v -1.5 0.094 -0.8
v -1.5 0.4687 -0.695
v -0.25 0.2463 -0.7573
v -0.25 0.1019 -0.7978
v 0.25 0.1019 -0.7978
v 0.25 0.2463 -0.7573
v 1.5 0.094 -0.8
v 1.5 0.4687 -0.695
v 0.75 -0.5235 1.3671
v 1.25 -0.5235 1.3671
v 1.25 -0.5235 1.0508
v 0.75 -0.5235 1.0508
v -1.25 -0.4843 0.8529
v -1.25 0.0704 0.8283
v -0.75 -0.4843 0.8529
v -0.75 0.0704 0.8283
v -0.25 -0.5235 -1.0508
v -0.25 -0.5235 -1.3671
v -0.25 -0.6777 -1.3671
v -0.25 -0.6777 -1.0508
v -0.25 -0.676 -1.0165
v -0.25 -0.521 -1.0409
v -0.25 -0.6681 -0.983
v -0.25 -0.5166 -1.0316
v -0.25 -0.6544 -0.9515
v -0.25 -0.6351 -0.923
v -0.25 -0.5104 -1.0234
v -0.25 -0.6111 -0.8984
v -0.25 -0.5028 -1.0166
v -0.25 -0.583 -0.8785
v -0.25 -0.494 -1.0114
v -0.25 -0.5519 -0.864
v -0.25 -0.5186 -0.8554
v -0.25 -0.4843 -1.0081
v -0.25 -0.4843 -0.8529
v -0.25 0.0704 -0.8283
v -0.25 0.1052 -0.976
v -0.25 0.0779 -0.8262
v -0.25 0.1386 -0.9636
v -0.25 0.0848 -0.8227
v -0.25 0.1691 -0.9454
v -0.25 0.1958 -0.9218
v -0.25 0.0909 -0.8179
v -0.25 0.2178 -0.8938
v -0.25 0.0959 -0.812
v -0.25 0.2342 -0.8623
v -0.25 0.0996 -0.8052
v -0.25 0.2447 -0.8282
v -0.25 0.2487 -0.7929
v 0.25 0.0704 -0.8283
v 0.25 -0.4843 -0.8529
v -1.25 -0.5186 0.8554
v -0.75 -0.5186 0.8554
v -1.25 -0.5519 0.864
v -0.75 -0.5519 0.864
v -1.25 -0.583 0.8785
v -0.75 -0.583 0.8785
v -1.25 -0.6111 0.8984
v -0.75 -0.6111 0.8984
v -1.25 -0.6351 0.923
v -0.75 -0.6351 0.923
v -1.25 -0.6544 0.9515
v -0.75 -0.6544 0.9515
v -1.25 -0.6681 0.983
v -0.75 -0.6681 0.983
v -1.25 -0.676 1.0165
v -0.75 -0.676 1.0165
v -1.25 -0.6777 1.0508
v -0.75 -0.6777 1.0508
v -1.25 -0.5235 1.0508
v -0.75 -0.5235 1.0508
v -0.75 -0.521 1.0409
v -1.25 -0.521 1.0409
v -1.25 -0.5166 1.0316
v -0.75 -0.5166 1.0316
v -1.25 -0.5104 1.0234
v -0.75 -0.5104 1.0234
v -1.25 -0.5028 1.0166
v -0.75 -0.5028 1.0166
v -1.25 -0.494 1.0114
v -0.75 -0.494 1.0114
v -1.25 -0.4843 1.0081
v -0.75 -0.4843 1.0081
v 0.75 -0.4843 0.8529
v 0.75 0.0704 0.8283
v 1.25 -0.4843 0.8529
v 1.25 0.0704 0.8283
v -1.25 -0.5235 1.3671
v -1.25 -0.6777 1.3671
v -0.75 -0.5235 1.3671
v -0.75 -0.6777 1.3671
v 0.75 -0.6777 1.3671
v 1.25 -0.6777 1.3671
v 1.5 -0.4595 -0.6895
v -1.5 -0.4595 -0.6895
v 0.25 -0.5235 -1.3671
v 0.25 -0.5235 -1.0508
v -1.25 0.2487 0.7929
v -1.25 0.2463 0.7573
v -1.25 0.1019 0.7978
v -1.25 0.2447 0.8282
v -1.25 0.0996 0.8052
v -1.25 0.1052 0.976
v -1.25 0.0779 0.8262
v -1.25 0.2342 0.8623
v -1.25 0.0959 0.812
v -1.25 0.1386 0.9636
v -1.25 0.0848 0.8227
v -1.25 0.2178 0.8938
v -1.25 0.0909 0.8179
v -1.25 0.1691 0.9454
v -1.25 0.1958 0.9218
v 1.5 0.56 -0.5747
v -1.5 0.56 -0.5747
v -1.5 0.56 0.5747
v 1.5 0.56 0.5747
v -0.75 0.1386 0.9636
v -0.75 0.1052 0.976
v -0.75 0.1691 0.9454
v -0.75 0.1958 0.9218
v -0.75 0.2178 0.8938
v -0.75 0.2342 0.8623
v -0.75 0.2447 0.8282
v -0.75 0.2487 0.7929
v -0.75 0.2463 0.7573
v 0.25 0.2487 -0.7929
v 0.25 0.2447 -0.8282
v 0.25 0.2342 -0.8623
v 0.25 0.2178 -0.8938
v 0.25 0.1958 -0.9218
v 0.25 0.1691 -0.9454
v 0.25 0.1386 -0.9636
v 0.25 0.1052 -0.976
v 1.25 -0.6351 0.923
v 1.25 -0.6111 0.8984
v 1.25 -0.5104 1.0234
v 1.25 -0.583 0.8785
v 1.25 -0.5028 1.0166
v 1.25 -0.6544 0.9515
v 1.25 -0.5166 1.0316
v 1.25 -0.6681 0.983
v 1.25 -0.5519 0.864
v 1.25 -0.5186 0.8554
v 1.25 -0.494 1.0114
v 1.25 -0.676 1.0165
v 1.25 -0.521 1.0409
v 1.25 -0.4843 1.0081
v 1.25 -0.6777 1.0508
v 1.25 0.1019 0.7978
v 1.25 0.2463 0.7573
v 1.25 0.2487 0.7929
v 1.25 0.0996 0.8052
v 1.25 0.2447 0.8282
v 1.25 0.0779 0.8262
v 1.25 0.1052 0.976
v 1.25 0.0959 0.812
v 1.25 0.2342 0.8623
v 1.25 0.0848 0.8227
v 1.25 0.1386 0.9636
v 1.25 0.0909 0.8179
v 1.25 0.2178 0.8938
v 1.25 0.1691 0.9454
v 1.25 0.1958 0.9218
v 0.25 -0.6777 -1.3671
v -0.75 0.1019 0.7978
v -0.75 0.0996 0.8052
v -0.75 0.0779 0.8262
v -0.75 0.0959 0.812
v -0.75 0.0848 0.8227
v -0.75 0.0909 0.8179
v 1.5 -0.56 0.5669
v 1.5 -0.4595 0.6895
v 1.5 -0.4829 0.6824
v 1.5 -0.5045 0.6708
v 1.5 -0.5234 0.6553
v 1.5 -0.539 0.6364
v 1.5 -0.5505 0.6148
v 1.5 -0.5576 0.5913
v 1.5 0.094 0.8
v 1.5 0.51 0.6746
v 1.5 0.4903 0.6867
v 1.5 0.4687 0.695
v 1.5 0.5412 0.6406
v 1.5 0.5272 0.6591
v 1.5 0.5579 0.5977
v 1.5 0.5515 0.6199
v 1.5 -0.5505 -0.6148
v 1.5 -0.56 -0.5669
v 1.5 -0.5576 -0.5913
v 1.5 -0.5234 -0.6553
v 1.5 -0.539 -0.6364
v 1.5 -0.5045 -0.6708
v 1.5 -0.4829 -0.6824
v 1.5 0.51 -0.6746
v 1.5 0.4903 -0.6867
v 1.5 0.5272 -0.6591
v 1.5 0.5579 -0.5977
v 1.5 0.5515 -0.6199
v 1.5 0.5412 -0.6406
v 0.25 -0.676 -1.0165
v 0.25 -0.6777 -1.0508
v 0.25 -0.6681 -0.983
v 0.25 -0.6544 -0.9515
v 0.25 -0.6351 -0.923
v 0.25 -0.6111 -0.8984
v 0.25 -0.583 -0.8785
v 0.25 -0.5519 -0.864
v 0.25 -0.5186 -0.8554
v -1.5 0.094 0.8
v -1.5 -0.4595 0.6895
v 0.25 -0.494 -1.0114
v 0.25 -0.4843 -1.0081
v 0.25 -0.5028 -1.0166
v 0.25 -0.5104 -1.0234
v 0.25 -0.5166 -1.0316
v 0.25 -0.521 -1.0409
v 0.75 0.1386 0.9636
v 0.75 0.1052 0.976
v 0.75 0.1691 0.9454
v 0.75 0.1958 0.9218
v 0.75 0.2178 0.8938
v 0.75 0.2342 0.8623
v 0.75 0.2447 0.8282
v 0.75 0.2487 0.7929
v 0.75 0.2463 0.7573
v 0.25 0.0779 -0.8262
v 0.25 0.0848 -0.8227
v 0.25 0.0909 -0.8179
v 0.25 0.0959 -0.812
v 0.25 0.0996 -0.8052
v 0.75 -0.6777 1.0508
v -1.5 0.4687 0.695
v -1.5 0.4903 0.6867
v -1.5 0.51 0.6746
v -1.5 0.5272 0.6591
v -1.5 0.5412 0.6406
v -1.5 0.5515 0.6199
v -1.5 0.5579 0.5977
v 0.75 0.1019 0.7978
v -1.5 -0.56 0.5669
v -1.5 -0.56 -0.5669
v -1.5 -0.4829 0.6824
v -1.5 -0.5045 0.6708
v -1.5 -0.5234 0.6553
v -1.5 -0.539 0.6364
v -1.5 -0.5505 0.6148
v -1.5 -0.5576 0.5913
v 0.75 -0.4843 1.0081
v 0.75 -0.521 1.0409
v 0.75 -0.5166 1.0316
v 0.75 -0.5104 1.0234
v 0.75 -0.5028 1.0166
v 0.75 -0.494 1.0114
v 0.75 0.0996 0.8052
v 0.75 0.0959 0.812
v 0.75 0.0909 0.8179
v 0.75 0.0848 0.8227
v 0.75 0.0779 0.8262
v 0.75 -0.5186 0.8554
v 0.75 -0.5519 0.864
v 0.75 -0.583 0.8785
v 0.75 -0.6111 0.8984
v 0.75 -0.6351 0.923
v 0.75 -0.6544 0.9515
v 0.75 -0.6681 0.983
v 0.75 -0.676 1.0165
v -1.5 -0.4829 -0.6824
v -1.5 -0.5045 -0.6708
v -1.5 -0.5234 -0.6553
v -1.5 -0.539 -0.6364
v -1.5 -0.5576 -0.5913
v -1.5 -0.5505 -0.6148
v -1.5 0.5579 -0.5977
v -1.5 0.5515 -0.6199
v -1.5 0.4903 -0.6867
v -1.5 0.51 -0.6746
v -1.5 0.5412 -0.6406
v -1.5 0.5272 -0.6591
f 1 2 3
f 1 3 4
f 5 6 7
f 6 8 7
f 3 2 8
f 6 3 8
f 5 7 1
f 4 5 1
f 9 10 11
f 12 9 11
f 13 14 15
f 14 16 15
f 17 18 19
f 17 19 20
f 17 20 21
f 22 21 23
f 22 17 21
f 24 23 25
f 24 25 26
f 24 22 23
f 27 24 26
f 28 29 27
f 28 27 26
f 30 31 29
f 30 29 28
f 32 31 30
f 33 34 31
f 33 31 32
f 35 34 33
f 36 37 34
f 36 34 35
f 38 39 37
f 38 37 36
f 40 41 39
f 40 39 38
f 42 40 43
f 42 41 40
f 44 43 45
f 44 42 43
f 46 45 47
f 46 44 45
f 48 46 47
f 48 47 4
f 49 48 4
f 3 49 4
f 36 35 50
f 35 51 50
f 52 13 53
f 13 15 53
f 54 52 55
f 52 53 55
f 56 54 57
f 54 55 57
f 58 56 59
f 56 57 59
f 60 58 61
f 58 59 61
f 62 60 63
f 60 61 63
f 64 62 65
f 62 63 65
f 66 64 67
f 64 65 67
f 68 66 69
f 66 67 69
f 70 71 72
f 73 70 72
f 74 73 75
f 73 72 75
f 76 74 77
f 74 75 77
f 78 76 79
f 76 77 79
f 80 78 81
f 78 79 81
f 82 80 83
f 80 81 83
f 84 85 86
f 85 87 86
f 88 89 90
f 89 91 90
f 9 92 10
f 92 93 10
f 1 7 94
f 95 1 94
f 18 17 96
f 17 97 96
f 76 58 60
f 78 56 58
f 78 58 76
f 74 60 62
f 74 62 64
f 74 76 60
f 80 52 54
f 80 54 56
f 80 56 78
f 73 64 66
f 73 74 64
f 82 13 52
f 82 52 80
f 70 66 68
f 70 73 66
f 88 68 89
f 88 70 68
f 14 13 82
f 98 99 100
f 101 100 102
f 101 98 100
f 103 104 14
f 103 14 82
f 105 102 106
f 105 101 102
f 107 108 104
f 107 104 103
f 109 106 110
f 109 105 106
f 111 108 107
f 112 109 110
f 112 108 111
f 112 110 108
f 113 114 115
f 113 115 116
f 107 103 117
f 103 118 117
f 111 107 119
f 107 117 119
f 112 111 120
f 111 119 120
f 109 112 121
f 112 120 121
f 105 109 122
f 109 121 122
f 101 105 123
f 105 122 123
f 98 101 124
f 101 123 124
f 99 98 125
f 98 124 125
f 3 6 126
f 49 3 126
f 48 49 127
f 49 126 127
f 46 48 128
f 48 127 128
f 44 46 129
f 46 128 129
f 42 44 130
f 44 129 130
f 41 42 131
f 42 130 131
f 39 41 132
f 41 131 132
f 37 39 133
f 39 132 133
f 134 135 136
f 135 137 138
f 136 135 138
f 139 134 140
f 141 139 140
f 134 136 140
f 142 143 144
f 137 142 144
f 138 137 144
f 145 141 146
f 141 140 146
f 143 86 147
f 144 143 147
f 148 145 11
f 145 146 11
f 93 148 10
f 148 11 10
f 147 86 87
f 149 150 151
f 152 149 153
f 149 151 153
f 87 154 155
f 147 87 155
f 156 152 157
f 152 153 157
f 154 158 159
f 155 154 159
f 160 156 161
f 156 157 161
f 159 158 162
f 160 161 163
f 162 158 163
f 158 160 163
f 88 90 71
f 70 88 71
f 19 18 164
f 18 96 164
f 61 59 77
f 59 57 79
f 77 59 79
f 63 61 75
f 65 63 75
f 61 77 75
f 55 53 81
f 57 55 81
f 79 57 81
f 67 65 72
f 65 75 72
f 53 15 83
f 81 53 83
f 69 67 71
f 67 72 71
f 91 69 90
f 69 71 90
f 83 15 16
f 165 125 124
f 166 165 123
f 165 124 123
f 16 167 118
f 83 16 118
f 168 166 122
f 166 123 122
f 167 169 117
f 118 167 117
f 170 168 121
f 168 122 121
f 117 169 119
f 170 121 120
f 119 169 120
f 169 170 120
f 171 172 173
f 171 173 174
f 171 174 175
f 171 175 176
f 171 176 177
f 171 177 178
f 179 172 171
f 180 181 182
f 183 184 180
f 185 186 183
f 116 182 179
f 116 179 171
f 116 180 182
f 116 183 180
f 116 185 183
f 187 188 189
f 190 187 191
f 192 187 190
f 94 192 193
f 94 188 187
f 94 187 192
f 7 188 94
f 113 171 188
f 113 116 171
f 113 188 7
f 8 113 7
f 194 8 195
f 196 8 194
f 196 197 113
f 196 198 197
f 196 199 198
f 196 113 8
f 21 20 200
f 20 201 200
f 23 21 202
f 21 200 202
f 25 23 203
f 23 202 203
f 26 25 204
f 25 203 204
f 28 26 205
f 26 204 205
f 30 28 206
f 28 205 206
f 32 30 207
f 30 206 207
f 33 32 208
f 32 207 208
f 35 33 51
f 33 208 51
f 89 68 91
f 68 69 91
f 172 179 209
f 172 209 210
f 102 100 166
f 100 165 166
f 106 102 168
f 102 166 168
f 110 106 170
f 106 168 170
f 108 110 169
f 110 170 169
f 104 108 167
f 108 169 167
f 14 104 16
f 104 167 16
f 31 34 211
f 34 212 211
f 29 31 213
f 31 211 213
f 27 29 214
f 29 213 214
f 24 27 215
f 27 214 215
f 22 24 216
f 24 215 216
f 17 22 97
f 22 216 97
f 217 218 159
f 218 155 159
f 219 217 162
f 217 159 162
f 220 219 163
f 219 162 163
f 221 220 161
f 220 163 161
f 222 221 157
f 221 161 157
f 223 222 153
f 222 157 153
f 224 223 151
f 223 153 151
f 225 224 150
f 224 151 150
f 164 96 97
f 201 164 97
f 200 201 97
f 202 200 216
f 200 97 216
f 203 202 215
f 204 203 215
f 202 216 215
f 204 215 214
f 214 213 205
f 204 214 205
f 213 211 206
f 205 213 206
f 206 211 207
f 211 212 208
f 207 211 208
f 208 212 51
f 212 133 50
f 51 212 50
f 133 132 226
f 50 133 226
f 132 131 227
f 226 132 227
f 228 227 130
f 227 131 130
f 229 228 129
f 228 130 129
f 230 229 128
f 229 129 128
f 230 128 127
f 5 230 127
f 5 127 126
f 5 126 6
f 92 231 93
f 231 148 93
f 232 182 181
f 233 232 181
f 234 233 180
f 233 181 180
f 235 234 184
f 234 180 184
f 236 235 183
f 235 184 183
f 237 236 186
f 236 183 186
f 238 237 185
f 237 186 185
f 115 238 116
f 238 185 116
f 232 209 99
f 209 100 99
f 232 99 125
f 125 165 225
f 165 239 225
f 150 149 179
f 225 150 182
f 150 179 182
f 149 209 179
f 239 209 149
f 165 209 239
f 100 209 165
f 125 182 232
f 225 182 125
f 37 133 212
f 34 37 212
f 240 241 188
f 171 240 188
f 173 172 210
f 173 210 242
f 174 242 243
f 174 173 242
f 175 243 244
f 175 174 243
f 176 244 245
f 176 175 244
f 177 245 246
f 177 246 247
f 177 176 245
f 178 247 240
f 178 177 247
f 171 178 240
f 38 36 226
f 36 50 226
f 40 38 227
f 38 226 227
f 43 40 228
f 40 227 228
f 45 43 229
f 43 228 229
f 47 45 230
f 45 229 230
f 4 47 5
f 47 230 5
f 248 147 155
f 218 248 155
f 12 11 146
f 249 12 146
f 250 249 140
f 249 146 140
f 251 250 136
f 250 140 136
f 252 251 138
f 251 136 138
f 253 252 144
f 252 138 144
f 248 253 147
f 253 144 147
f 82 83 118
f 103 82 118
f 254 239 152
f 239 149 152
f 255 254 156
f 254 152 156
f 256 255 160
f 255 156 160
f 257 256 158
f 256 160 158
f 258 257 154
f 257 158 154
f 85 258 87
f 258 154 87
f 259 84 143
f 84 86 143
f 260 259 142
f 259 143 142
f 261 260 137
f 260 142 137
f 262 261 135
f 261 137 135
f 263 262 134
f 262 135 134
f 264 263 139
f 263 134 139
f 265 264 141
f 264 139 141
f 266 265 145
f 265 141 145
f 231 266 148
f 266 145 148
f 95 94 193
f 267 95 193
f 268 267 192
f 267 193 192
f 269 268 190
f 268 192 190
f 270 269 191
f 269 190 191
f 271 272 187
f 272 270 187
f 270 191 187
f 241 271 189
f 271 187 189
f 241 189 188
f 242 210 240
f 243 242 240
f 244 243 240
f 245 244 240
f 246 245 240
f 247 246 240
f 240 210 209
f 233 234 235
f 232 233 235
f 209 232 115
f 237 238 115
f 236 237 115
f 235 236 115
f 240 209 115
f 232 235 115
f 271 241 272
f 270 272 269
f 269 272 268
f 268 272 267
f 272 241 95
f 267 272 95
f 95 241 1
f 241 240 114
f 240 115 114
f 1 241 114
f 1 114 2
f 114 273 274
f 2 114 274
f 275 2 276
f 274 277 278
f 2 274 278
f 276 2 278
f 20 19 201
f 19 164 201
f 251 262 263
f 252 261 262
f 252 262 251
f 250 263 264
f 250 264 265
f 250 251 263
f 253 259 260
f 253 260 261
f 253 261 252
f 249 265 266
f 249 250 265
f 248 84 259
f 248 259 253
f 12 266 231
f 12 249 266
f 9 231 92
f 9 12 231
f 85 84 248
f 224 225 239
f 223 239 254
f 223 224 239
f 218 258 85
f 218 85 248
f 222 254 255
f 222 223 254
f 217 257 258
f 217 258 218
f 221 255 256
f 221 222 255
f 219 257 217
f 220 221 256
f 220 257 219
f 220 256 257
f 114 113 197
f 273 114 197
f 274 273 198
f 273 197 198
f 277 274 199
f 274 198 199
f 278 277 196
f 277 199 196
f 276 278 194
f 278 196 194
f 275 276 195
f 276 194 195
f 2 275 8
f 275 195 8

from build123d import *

# Parameters (mm, degrees)
SKETCH1_W           = 3
SKETCH1_H           = 1.6
BOSS_EXTRUDE1_DEPTH = 0.56
CUT_EXTRUDE1_DEPTH  = 4.154932646
BOSS_EXTRUDE2_DEPTH = 0.25
BOSS_EXTRUDE3_DEPTH = 0.25
LPATTERN1_COUNT     = 2
LPATTERN1_PITCH     = 1
LPATTERN1_COL_COUNT = 2
LPATTERN1_COL_PITCH = 1
CUT_EXTRUDE2_DEPTH  = 0.5


with BuildPart() as part:
    # Sketch1 → Boss-Extrude1 (new, symmetric)
    with BuildSketch(Plane(origin=(0, 0, 0), x_dir=(1, 0, 0), z_dir=(0, 1, 0))):
        Rectangle(SKETCH1_W, SKETCH1_H)
    extrude(amount=BOSS_EXTRUDE1_DEPTH, both=True)

    # Sketch3 → Cut-Extrude1 (cut, through all)
    with BuildSketch(Plane(origin=(1.5, 0, 0), x_dir=(0, 0, -1), z_dir=(1, 0, 0))):
        with BuildLine():
            Line((-0.8, 0.094016152), (-0.695023925, 0.468721213))
            ThreePointArc((-0.695023925, 0.468721213), (-0.650189265, 0.534599577), (-0.574658316, 0.56))
            Line((-0.574658316, 0.56), (-0.8, 0.56))
            Line((-0.8, 0.56), (-0.8, 0.094016152))
        make_face()
        with BuildLine():
            ThreePointArc((0.68951869, -0.459468594), (0.646203649, -0.531652921), (0.56693693, -0.56))
            Line((0.56693693, -0.56), (0.8, -0.56))
            Line((0.8, -0.56), (0.8, 0.094016152))
            Line((0.8, 0.094016152), (0.68951869, -0.459468594))
        make_face()
        with BuildLine():
            Line((0.8, 0.56), (0.574658316, 0.56))
            ThreePointArc((0.574658316, 0.56), (0.650189265, 0.534599577), (0.695023925, 0.468721213))
            Line((0.695023925, 0.468721213), (0.8, 0.094016152))
            Line((0.8, 0.094016152), (0.8, 0.56))
        make_face()
        with BuildLine():
            Line((-0.8, 0.094016152), (-0.68951869, -0.459468594))
            ThreePointArc((-0.68951869, -0.459468594), (-0.646203649, -0.531652921), (-0.56693693, -0.56))
            Line((-0.56693693, -0.56), (-0.8, -0.56))
            Line((-0.8, -0.56), (-0.8, 0.094016152))
        make_face()
    extrude(amount=-CUT_EXTRUDE1_DEPTH, mode=Mode.SUBTRACT)

    # Sketch4 → Boss-Extrude2 (add, symmetric)
    with BuildSketch(Plane(origin=(0, 0, 0), x_dir=(0, 0, -1), z_dir=(1, 0, 0))):
        with BuildLine():
            Line((0.976030545, 0.105182979), (1.008085847, -0.484278406))
            ThreePointArc((1.008085847, -0.484278406), (1.023433461, -0.510437852), (1.050826249, -0.523457109))
            Line((1.050826249, -0.523457109), (1.367055221, -0.523457109))
            Line((1.367055221, -0.523457109), (1.367055221, -0.677667296))
            Line((1.367055221, -0.677667296), (1.050826249, -0.677667296))
            ThreePointArc((1.050826249, -0.677667296), (0.910132045, -0.623686799), (0.852912703, -0.484278406))
            Line((0.852912703, -0.484278406), (0.828306269, 0.070433264))
            ThreePointArc((0.828306269, 0.070433264), (0.817908815, 0.090877142), (0.797792626, 0.101895224))
            Line((0.797792626, 0.101895224), (0.757349025, 0.246255946))
            ThreePointArc((0.757349025, 0.246255946), (0.893810861, 0.217760671), (0.976030545, 0.105182979))
        make_face()
    extrude(amount=BOSS_EXTRUDE2_DEPTH, both=True)

    # Sketch5 → Boss-Extrude3 (add, symmetric)
    with BuildSketch(Plane(origin=(0, 0, 0), x_dir=(0, 0, -1), z_dir=(1, 0, 0))):
        with BuildLine():
            Line((-1.008085847, -0.484278406), (-0.976030545, 0.105182979))
            ThreePointArc((-0.976030545, 0.105182979), (-0.893810861, 0.217760671), (-0.757349025, 0.246255946))
            Line((-0.757349025, 0.246255946), (-0.797792626, 0.101895224))
            ThreePointArc((-0.797792626, 0.101895224), (-0.817908815, 0.090877142), (-0.828306269, 0.070433264))
            Line((-0.828306269, 0.070433264), (-0.852912703, -0.484278406))
            ThreePointArc((-0.852912703, -0.484278406), (-0.910132045, -0.623686799), (-1.050826249, -0.677667296))
            Line((-1.050826249, -0.677667296), (-1.367055221, -0.677667296))
            Line((-1.367055221, -0.677667296), (-1.367055221, -0.523457109))
            Line((-1.367055221, -0.523457109), (-1.050826249, -0.523457109))
            ThreePointArc((-1.050826249, -0.523457109), (-1.023433461, -0.510437852), (-1.008085847, -0.484278406))
        make_face()
    boss_extrude3 = extrude(amount=BOSS_EXTRUDE3_DEPTH, both=True)

    # LPattern1: Boss-Extrude3 ×2
    with Locations(*[(i * LPATTERN1_PITCH, 0, 0) for i in range(1, LPATTERN1_COUNT)]):
        add(boss_extrude3)

    # LPattern1 col: Boss-Extrude3 ×2
    with Locations(*[(-i * LPATTERN1_COL_PITCH, 0, 0) for i in range(1, LPATTERN1_COL_COUNT)]):
        add(boss_extrude3)

    # Sketch6 → Cut-Extrude2 (cut)
    with BuildSketch(Plane(origin=(0.25, 0, 0), x_dir=(0, 0, -1), z_dir=(1, 0, 0))):
        with BuildLine():
            Line((-1.050826249, -0.523457109), (-1.367055221, -0.523457109))
            Line((-1.367055221, -0.523457109), (-1.367055221, -0.677667296))
            Line((-1.367055221, -0.677667296), (-1.050826249, -0.677667296))
            ThreePointArc((-1.050826249, -0.677667296), (-0.910132045, -0.623686799), (-0.852912703, -0.484278406))
            Line((-0.852912703, -0.484278406), (-0.828306269, 0.070433264))
            ThreePointArc((-0.828306269, 0.070433264), (-0.817908815, 0.090877142), (-0.797792626, 0.101895224))
            Line((-0.797792626, 0.101895224), (-0.757349025, 0.246255946))
            ThreePointArc((-0.757349025, 0.246255946), (-0.893810861, 0.217760671), (-0.976030545, 0.105182979))
            Line((-0.976030545, 0.105182979), (-1.008085847, -0.484278406))
            ThreePointArc((-1.008085847, -0.484278406), (-1.023433461, -0.510437852), (-1.050826249, -0.523457109))
        make_face()
    extrude(amount=-CUT_EXTRUDE2_DEPTH, mode=Mode.SUBTRACT)


solid = part.part
